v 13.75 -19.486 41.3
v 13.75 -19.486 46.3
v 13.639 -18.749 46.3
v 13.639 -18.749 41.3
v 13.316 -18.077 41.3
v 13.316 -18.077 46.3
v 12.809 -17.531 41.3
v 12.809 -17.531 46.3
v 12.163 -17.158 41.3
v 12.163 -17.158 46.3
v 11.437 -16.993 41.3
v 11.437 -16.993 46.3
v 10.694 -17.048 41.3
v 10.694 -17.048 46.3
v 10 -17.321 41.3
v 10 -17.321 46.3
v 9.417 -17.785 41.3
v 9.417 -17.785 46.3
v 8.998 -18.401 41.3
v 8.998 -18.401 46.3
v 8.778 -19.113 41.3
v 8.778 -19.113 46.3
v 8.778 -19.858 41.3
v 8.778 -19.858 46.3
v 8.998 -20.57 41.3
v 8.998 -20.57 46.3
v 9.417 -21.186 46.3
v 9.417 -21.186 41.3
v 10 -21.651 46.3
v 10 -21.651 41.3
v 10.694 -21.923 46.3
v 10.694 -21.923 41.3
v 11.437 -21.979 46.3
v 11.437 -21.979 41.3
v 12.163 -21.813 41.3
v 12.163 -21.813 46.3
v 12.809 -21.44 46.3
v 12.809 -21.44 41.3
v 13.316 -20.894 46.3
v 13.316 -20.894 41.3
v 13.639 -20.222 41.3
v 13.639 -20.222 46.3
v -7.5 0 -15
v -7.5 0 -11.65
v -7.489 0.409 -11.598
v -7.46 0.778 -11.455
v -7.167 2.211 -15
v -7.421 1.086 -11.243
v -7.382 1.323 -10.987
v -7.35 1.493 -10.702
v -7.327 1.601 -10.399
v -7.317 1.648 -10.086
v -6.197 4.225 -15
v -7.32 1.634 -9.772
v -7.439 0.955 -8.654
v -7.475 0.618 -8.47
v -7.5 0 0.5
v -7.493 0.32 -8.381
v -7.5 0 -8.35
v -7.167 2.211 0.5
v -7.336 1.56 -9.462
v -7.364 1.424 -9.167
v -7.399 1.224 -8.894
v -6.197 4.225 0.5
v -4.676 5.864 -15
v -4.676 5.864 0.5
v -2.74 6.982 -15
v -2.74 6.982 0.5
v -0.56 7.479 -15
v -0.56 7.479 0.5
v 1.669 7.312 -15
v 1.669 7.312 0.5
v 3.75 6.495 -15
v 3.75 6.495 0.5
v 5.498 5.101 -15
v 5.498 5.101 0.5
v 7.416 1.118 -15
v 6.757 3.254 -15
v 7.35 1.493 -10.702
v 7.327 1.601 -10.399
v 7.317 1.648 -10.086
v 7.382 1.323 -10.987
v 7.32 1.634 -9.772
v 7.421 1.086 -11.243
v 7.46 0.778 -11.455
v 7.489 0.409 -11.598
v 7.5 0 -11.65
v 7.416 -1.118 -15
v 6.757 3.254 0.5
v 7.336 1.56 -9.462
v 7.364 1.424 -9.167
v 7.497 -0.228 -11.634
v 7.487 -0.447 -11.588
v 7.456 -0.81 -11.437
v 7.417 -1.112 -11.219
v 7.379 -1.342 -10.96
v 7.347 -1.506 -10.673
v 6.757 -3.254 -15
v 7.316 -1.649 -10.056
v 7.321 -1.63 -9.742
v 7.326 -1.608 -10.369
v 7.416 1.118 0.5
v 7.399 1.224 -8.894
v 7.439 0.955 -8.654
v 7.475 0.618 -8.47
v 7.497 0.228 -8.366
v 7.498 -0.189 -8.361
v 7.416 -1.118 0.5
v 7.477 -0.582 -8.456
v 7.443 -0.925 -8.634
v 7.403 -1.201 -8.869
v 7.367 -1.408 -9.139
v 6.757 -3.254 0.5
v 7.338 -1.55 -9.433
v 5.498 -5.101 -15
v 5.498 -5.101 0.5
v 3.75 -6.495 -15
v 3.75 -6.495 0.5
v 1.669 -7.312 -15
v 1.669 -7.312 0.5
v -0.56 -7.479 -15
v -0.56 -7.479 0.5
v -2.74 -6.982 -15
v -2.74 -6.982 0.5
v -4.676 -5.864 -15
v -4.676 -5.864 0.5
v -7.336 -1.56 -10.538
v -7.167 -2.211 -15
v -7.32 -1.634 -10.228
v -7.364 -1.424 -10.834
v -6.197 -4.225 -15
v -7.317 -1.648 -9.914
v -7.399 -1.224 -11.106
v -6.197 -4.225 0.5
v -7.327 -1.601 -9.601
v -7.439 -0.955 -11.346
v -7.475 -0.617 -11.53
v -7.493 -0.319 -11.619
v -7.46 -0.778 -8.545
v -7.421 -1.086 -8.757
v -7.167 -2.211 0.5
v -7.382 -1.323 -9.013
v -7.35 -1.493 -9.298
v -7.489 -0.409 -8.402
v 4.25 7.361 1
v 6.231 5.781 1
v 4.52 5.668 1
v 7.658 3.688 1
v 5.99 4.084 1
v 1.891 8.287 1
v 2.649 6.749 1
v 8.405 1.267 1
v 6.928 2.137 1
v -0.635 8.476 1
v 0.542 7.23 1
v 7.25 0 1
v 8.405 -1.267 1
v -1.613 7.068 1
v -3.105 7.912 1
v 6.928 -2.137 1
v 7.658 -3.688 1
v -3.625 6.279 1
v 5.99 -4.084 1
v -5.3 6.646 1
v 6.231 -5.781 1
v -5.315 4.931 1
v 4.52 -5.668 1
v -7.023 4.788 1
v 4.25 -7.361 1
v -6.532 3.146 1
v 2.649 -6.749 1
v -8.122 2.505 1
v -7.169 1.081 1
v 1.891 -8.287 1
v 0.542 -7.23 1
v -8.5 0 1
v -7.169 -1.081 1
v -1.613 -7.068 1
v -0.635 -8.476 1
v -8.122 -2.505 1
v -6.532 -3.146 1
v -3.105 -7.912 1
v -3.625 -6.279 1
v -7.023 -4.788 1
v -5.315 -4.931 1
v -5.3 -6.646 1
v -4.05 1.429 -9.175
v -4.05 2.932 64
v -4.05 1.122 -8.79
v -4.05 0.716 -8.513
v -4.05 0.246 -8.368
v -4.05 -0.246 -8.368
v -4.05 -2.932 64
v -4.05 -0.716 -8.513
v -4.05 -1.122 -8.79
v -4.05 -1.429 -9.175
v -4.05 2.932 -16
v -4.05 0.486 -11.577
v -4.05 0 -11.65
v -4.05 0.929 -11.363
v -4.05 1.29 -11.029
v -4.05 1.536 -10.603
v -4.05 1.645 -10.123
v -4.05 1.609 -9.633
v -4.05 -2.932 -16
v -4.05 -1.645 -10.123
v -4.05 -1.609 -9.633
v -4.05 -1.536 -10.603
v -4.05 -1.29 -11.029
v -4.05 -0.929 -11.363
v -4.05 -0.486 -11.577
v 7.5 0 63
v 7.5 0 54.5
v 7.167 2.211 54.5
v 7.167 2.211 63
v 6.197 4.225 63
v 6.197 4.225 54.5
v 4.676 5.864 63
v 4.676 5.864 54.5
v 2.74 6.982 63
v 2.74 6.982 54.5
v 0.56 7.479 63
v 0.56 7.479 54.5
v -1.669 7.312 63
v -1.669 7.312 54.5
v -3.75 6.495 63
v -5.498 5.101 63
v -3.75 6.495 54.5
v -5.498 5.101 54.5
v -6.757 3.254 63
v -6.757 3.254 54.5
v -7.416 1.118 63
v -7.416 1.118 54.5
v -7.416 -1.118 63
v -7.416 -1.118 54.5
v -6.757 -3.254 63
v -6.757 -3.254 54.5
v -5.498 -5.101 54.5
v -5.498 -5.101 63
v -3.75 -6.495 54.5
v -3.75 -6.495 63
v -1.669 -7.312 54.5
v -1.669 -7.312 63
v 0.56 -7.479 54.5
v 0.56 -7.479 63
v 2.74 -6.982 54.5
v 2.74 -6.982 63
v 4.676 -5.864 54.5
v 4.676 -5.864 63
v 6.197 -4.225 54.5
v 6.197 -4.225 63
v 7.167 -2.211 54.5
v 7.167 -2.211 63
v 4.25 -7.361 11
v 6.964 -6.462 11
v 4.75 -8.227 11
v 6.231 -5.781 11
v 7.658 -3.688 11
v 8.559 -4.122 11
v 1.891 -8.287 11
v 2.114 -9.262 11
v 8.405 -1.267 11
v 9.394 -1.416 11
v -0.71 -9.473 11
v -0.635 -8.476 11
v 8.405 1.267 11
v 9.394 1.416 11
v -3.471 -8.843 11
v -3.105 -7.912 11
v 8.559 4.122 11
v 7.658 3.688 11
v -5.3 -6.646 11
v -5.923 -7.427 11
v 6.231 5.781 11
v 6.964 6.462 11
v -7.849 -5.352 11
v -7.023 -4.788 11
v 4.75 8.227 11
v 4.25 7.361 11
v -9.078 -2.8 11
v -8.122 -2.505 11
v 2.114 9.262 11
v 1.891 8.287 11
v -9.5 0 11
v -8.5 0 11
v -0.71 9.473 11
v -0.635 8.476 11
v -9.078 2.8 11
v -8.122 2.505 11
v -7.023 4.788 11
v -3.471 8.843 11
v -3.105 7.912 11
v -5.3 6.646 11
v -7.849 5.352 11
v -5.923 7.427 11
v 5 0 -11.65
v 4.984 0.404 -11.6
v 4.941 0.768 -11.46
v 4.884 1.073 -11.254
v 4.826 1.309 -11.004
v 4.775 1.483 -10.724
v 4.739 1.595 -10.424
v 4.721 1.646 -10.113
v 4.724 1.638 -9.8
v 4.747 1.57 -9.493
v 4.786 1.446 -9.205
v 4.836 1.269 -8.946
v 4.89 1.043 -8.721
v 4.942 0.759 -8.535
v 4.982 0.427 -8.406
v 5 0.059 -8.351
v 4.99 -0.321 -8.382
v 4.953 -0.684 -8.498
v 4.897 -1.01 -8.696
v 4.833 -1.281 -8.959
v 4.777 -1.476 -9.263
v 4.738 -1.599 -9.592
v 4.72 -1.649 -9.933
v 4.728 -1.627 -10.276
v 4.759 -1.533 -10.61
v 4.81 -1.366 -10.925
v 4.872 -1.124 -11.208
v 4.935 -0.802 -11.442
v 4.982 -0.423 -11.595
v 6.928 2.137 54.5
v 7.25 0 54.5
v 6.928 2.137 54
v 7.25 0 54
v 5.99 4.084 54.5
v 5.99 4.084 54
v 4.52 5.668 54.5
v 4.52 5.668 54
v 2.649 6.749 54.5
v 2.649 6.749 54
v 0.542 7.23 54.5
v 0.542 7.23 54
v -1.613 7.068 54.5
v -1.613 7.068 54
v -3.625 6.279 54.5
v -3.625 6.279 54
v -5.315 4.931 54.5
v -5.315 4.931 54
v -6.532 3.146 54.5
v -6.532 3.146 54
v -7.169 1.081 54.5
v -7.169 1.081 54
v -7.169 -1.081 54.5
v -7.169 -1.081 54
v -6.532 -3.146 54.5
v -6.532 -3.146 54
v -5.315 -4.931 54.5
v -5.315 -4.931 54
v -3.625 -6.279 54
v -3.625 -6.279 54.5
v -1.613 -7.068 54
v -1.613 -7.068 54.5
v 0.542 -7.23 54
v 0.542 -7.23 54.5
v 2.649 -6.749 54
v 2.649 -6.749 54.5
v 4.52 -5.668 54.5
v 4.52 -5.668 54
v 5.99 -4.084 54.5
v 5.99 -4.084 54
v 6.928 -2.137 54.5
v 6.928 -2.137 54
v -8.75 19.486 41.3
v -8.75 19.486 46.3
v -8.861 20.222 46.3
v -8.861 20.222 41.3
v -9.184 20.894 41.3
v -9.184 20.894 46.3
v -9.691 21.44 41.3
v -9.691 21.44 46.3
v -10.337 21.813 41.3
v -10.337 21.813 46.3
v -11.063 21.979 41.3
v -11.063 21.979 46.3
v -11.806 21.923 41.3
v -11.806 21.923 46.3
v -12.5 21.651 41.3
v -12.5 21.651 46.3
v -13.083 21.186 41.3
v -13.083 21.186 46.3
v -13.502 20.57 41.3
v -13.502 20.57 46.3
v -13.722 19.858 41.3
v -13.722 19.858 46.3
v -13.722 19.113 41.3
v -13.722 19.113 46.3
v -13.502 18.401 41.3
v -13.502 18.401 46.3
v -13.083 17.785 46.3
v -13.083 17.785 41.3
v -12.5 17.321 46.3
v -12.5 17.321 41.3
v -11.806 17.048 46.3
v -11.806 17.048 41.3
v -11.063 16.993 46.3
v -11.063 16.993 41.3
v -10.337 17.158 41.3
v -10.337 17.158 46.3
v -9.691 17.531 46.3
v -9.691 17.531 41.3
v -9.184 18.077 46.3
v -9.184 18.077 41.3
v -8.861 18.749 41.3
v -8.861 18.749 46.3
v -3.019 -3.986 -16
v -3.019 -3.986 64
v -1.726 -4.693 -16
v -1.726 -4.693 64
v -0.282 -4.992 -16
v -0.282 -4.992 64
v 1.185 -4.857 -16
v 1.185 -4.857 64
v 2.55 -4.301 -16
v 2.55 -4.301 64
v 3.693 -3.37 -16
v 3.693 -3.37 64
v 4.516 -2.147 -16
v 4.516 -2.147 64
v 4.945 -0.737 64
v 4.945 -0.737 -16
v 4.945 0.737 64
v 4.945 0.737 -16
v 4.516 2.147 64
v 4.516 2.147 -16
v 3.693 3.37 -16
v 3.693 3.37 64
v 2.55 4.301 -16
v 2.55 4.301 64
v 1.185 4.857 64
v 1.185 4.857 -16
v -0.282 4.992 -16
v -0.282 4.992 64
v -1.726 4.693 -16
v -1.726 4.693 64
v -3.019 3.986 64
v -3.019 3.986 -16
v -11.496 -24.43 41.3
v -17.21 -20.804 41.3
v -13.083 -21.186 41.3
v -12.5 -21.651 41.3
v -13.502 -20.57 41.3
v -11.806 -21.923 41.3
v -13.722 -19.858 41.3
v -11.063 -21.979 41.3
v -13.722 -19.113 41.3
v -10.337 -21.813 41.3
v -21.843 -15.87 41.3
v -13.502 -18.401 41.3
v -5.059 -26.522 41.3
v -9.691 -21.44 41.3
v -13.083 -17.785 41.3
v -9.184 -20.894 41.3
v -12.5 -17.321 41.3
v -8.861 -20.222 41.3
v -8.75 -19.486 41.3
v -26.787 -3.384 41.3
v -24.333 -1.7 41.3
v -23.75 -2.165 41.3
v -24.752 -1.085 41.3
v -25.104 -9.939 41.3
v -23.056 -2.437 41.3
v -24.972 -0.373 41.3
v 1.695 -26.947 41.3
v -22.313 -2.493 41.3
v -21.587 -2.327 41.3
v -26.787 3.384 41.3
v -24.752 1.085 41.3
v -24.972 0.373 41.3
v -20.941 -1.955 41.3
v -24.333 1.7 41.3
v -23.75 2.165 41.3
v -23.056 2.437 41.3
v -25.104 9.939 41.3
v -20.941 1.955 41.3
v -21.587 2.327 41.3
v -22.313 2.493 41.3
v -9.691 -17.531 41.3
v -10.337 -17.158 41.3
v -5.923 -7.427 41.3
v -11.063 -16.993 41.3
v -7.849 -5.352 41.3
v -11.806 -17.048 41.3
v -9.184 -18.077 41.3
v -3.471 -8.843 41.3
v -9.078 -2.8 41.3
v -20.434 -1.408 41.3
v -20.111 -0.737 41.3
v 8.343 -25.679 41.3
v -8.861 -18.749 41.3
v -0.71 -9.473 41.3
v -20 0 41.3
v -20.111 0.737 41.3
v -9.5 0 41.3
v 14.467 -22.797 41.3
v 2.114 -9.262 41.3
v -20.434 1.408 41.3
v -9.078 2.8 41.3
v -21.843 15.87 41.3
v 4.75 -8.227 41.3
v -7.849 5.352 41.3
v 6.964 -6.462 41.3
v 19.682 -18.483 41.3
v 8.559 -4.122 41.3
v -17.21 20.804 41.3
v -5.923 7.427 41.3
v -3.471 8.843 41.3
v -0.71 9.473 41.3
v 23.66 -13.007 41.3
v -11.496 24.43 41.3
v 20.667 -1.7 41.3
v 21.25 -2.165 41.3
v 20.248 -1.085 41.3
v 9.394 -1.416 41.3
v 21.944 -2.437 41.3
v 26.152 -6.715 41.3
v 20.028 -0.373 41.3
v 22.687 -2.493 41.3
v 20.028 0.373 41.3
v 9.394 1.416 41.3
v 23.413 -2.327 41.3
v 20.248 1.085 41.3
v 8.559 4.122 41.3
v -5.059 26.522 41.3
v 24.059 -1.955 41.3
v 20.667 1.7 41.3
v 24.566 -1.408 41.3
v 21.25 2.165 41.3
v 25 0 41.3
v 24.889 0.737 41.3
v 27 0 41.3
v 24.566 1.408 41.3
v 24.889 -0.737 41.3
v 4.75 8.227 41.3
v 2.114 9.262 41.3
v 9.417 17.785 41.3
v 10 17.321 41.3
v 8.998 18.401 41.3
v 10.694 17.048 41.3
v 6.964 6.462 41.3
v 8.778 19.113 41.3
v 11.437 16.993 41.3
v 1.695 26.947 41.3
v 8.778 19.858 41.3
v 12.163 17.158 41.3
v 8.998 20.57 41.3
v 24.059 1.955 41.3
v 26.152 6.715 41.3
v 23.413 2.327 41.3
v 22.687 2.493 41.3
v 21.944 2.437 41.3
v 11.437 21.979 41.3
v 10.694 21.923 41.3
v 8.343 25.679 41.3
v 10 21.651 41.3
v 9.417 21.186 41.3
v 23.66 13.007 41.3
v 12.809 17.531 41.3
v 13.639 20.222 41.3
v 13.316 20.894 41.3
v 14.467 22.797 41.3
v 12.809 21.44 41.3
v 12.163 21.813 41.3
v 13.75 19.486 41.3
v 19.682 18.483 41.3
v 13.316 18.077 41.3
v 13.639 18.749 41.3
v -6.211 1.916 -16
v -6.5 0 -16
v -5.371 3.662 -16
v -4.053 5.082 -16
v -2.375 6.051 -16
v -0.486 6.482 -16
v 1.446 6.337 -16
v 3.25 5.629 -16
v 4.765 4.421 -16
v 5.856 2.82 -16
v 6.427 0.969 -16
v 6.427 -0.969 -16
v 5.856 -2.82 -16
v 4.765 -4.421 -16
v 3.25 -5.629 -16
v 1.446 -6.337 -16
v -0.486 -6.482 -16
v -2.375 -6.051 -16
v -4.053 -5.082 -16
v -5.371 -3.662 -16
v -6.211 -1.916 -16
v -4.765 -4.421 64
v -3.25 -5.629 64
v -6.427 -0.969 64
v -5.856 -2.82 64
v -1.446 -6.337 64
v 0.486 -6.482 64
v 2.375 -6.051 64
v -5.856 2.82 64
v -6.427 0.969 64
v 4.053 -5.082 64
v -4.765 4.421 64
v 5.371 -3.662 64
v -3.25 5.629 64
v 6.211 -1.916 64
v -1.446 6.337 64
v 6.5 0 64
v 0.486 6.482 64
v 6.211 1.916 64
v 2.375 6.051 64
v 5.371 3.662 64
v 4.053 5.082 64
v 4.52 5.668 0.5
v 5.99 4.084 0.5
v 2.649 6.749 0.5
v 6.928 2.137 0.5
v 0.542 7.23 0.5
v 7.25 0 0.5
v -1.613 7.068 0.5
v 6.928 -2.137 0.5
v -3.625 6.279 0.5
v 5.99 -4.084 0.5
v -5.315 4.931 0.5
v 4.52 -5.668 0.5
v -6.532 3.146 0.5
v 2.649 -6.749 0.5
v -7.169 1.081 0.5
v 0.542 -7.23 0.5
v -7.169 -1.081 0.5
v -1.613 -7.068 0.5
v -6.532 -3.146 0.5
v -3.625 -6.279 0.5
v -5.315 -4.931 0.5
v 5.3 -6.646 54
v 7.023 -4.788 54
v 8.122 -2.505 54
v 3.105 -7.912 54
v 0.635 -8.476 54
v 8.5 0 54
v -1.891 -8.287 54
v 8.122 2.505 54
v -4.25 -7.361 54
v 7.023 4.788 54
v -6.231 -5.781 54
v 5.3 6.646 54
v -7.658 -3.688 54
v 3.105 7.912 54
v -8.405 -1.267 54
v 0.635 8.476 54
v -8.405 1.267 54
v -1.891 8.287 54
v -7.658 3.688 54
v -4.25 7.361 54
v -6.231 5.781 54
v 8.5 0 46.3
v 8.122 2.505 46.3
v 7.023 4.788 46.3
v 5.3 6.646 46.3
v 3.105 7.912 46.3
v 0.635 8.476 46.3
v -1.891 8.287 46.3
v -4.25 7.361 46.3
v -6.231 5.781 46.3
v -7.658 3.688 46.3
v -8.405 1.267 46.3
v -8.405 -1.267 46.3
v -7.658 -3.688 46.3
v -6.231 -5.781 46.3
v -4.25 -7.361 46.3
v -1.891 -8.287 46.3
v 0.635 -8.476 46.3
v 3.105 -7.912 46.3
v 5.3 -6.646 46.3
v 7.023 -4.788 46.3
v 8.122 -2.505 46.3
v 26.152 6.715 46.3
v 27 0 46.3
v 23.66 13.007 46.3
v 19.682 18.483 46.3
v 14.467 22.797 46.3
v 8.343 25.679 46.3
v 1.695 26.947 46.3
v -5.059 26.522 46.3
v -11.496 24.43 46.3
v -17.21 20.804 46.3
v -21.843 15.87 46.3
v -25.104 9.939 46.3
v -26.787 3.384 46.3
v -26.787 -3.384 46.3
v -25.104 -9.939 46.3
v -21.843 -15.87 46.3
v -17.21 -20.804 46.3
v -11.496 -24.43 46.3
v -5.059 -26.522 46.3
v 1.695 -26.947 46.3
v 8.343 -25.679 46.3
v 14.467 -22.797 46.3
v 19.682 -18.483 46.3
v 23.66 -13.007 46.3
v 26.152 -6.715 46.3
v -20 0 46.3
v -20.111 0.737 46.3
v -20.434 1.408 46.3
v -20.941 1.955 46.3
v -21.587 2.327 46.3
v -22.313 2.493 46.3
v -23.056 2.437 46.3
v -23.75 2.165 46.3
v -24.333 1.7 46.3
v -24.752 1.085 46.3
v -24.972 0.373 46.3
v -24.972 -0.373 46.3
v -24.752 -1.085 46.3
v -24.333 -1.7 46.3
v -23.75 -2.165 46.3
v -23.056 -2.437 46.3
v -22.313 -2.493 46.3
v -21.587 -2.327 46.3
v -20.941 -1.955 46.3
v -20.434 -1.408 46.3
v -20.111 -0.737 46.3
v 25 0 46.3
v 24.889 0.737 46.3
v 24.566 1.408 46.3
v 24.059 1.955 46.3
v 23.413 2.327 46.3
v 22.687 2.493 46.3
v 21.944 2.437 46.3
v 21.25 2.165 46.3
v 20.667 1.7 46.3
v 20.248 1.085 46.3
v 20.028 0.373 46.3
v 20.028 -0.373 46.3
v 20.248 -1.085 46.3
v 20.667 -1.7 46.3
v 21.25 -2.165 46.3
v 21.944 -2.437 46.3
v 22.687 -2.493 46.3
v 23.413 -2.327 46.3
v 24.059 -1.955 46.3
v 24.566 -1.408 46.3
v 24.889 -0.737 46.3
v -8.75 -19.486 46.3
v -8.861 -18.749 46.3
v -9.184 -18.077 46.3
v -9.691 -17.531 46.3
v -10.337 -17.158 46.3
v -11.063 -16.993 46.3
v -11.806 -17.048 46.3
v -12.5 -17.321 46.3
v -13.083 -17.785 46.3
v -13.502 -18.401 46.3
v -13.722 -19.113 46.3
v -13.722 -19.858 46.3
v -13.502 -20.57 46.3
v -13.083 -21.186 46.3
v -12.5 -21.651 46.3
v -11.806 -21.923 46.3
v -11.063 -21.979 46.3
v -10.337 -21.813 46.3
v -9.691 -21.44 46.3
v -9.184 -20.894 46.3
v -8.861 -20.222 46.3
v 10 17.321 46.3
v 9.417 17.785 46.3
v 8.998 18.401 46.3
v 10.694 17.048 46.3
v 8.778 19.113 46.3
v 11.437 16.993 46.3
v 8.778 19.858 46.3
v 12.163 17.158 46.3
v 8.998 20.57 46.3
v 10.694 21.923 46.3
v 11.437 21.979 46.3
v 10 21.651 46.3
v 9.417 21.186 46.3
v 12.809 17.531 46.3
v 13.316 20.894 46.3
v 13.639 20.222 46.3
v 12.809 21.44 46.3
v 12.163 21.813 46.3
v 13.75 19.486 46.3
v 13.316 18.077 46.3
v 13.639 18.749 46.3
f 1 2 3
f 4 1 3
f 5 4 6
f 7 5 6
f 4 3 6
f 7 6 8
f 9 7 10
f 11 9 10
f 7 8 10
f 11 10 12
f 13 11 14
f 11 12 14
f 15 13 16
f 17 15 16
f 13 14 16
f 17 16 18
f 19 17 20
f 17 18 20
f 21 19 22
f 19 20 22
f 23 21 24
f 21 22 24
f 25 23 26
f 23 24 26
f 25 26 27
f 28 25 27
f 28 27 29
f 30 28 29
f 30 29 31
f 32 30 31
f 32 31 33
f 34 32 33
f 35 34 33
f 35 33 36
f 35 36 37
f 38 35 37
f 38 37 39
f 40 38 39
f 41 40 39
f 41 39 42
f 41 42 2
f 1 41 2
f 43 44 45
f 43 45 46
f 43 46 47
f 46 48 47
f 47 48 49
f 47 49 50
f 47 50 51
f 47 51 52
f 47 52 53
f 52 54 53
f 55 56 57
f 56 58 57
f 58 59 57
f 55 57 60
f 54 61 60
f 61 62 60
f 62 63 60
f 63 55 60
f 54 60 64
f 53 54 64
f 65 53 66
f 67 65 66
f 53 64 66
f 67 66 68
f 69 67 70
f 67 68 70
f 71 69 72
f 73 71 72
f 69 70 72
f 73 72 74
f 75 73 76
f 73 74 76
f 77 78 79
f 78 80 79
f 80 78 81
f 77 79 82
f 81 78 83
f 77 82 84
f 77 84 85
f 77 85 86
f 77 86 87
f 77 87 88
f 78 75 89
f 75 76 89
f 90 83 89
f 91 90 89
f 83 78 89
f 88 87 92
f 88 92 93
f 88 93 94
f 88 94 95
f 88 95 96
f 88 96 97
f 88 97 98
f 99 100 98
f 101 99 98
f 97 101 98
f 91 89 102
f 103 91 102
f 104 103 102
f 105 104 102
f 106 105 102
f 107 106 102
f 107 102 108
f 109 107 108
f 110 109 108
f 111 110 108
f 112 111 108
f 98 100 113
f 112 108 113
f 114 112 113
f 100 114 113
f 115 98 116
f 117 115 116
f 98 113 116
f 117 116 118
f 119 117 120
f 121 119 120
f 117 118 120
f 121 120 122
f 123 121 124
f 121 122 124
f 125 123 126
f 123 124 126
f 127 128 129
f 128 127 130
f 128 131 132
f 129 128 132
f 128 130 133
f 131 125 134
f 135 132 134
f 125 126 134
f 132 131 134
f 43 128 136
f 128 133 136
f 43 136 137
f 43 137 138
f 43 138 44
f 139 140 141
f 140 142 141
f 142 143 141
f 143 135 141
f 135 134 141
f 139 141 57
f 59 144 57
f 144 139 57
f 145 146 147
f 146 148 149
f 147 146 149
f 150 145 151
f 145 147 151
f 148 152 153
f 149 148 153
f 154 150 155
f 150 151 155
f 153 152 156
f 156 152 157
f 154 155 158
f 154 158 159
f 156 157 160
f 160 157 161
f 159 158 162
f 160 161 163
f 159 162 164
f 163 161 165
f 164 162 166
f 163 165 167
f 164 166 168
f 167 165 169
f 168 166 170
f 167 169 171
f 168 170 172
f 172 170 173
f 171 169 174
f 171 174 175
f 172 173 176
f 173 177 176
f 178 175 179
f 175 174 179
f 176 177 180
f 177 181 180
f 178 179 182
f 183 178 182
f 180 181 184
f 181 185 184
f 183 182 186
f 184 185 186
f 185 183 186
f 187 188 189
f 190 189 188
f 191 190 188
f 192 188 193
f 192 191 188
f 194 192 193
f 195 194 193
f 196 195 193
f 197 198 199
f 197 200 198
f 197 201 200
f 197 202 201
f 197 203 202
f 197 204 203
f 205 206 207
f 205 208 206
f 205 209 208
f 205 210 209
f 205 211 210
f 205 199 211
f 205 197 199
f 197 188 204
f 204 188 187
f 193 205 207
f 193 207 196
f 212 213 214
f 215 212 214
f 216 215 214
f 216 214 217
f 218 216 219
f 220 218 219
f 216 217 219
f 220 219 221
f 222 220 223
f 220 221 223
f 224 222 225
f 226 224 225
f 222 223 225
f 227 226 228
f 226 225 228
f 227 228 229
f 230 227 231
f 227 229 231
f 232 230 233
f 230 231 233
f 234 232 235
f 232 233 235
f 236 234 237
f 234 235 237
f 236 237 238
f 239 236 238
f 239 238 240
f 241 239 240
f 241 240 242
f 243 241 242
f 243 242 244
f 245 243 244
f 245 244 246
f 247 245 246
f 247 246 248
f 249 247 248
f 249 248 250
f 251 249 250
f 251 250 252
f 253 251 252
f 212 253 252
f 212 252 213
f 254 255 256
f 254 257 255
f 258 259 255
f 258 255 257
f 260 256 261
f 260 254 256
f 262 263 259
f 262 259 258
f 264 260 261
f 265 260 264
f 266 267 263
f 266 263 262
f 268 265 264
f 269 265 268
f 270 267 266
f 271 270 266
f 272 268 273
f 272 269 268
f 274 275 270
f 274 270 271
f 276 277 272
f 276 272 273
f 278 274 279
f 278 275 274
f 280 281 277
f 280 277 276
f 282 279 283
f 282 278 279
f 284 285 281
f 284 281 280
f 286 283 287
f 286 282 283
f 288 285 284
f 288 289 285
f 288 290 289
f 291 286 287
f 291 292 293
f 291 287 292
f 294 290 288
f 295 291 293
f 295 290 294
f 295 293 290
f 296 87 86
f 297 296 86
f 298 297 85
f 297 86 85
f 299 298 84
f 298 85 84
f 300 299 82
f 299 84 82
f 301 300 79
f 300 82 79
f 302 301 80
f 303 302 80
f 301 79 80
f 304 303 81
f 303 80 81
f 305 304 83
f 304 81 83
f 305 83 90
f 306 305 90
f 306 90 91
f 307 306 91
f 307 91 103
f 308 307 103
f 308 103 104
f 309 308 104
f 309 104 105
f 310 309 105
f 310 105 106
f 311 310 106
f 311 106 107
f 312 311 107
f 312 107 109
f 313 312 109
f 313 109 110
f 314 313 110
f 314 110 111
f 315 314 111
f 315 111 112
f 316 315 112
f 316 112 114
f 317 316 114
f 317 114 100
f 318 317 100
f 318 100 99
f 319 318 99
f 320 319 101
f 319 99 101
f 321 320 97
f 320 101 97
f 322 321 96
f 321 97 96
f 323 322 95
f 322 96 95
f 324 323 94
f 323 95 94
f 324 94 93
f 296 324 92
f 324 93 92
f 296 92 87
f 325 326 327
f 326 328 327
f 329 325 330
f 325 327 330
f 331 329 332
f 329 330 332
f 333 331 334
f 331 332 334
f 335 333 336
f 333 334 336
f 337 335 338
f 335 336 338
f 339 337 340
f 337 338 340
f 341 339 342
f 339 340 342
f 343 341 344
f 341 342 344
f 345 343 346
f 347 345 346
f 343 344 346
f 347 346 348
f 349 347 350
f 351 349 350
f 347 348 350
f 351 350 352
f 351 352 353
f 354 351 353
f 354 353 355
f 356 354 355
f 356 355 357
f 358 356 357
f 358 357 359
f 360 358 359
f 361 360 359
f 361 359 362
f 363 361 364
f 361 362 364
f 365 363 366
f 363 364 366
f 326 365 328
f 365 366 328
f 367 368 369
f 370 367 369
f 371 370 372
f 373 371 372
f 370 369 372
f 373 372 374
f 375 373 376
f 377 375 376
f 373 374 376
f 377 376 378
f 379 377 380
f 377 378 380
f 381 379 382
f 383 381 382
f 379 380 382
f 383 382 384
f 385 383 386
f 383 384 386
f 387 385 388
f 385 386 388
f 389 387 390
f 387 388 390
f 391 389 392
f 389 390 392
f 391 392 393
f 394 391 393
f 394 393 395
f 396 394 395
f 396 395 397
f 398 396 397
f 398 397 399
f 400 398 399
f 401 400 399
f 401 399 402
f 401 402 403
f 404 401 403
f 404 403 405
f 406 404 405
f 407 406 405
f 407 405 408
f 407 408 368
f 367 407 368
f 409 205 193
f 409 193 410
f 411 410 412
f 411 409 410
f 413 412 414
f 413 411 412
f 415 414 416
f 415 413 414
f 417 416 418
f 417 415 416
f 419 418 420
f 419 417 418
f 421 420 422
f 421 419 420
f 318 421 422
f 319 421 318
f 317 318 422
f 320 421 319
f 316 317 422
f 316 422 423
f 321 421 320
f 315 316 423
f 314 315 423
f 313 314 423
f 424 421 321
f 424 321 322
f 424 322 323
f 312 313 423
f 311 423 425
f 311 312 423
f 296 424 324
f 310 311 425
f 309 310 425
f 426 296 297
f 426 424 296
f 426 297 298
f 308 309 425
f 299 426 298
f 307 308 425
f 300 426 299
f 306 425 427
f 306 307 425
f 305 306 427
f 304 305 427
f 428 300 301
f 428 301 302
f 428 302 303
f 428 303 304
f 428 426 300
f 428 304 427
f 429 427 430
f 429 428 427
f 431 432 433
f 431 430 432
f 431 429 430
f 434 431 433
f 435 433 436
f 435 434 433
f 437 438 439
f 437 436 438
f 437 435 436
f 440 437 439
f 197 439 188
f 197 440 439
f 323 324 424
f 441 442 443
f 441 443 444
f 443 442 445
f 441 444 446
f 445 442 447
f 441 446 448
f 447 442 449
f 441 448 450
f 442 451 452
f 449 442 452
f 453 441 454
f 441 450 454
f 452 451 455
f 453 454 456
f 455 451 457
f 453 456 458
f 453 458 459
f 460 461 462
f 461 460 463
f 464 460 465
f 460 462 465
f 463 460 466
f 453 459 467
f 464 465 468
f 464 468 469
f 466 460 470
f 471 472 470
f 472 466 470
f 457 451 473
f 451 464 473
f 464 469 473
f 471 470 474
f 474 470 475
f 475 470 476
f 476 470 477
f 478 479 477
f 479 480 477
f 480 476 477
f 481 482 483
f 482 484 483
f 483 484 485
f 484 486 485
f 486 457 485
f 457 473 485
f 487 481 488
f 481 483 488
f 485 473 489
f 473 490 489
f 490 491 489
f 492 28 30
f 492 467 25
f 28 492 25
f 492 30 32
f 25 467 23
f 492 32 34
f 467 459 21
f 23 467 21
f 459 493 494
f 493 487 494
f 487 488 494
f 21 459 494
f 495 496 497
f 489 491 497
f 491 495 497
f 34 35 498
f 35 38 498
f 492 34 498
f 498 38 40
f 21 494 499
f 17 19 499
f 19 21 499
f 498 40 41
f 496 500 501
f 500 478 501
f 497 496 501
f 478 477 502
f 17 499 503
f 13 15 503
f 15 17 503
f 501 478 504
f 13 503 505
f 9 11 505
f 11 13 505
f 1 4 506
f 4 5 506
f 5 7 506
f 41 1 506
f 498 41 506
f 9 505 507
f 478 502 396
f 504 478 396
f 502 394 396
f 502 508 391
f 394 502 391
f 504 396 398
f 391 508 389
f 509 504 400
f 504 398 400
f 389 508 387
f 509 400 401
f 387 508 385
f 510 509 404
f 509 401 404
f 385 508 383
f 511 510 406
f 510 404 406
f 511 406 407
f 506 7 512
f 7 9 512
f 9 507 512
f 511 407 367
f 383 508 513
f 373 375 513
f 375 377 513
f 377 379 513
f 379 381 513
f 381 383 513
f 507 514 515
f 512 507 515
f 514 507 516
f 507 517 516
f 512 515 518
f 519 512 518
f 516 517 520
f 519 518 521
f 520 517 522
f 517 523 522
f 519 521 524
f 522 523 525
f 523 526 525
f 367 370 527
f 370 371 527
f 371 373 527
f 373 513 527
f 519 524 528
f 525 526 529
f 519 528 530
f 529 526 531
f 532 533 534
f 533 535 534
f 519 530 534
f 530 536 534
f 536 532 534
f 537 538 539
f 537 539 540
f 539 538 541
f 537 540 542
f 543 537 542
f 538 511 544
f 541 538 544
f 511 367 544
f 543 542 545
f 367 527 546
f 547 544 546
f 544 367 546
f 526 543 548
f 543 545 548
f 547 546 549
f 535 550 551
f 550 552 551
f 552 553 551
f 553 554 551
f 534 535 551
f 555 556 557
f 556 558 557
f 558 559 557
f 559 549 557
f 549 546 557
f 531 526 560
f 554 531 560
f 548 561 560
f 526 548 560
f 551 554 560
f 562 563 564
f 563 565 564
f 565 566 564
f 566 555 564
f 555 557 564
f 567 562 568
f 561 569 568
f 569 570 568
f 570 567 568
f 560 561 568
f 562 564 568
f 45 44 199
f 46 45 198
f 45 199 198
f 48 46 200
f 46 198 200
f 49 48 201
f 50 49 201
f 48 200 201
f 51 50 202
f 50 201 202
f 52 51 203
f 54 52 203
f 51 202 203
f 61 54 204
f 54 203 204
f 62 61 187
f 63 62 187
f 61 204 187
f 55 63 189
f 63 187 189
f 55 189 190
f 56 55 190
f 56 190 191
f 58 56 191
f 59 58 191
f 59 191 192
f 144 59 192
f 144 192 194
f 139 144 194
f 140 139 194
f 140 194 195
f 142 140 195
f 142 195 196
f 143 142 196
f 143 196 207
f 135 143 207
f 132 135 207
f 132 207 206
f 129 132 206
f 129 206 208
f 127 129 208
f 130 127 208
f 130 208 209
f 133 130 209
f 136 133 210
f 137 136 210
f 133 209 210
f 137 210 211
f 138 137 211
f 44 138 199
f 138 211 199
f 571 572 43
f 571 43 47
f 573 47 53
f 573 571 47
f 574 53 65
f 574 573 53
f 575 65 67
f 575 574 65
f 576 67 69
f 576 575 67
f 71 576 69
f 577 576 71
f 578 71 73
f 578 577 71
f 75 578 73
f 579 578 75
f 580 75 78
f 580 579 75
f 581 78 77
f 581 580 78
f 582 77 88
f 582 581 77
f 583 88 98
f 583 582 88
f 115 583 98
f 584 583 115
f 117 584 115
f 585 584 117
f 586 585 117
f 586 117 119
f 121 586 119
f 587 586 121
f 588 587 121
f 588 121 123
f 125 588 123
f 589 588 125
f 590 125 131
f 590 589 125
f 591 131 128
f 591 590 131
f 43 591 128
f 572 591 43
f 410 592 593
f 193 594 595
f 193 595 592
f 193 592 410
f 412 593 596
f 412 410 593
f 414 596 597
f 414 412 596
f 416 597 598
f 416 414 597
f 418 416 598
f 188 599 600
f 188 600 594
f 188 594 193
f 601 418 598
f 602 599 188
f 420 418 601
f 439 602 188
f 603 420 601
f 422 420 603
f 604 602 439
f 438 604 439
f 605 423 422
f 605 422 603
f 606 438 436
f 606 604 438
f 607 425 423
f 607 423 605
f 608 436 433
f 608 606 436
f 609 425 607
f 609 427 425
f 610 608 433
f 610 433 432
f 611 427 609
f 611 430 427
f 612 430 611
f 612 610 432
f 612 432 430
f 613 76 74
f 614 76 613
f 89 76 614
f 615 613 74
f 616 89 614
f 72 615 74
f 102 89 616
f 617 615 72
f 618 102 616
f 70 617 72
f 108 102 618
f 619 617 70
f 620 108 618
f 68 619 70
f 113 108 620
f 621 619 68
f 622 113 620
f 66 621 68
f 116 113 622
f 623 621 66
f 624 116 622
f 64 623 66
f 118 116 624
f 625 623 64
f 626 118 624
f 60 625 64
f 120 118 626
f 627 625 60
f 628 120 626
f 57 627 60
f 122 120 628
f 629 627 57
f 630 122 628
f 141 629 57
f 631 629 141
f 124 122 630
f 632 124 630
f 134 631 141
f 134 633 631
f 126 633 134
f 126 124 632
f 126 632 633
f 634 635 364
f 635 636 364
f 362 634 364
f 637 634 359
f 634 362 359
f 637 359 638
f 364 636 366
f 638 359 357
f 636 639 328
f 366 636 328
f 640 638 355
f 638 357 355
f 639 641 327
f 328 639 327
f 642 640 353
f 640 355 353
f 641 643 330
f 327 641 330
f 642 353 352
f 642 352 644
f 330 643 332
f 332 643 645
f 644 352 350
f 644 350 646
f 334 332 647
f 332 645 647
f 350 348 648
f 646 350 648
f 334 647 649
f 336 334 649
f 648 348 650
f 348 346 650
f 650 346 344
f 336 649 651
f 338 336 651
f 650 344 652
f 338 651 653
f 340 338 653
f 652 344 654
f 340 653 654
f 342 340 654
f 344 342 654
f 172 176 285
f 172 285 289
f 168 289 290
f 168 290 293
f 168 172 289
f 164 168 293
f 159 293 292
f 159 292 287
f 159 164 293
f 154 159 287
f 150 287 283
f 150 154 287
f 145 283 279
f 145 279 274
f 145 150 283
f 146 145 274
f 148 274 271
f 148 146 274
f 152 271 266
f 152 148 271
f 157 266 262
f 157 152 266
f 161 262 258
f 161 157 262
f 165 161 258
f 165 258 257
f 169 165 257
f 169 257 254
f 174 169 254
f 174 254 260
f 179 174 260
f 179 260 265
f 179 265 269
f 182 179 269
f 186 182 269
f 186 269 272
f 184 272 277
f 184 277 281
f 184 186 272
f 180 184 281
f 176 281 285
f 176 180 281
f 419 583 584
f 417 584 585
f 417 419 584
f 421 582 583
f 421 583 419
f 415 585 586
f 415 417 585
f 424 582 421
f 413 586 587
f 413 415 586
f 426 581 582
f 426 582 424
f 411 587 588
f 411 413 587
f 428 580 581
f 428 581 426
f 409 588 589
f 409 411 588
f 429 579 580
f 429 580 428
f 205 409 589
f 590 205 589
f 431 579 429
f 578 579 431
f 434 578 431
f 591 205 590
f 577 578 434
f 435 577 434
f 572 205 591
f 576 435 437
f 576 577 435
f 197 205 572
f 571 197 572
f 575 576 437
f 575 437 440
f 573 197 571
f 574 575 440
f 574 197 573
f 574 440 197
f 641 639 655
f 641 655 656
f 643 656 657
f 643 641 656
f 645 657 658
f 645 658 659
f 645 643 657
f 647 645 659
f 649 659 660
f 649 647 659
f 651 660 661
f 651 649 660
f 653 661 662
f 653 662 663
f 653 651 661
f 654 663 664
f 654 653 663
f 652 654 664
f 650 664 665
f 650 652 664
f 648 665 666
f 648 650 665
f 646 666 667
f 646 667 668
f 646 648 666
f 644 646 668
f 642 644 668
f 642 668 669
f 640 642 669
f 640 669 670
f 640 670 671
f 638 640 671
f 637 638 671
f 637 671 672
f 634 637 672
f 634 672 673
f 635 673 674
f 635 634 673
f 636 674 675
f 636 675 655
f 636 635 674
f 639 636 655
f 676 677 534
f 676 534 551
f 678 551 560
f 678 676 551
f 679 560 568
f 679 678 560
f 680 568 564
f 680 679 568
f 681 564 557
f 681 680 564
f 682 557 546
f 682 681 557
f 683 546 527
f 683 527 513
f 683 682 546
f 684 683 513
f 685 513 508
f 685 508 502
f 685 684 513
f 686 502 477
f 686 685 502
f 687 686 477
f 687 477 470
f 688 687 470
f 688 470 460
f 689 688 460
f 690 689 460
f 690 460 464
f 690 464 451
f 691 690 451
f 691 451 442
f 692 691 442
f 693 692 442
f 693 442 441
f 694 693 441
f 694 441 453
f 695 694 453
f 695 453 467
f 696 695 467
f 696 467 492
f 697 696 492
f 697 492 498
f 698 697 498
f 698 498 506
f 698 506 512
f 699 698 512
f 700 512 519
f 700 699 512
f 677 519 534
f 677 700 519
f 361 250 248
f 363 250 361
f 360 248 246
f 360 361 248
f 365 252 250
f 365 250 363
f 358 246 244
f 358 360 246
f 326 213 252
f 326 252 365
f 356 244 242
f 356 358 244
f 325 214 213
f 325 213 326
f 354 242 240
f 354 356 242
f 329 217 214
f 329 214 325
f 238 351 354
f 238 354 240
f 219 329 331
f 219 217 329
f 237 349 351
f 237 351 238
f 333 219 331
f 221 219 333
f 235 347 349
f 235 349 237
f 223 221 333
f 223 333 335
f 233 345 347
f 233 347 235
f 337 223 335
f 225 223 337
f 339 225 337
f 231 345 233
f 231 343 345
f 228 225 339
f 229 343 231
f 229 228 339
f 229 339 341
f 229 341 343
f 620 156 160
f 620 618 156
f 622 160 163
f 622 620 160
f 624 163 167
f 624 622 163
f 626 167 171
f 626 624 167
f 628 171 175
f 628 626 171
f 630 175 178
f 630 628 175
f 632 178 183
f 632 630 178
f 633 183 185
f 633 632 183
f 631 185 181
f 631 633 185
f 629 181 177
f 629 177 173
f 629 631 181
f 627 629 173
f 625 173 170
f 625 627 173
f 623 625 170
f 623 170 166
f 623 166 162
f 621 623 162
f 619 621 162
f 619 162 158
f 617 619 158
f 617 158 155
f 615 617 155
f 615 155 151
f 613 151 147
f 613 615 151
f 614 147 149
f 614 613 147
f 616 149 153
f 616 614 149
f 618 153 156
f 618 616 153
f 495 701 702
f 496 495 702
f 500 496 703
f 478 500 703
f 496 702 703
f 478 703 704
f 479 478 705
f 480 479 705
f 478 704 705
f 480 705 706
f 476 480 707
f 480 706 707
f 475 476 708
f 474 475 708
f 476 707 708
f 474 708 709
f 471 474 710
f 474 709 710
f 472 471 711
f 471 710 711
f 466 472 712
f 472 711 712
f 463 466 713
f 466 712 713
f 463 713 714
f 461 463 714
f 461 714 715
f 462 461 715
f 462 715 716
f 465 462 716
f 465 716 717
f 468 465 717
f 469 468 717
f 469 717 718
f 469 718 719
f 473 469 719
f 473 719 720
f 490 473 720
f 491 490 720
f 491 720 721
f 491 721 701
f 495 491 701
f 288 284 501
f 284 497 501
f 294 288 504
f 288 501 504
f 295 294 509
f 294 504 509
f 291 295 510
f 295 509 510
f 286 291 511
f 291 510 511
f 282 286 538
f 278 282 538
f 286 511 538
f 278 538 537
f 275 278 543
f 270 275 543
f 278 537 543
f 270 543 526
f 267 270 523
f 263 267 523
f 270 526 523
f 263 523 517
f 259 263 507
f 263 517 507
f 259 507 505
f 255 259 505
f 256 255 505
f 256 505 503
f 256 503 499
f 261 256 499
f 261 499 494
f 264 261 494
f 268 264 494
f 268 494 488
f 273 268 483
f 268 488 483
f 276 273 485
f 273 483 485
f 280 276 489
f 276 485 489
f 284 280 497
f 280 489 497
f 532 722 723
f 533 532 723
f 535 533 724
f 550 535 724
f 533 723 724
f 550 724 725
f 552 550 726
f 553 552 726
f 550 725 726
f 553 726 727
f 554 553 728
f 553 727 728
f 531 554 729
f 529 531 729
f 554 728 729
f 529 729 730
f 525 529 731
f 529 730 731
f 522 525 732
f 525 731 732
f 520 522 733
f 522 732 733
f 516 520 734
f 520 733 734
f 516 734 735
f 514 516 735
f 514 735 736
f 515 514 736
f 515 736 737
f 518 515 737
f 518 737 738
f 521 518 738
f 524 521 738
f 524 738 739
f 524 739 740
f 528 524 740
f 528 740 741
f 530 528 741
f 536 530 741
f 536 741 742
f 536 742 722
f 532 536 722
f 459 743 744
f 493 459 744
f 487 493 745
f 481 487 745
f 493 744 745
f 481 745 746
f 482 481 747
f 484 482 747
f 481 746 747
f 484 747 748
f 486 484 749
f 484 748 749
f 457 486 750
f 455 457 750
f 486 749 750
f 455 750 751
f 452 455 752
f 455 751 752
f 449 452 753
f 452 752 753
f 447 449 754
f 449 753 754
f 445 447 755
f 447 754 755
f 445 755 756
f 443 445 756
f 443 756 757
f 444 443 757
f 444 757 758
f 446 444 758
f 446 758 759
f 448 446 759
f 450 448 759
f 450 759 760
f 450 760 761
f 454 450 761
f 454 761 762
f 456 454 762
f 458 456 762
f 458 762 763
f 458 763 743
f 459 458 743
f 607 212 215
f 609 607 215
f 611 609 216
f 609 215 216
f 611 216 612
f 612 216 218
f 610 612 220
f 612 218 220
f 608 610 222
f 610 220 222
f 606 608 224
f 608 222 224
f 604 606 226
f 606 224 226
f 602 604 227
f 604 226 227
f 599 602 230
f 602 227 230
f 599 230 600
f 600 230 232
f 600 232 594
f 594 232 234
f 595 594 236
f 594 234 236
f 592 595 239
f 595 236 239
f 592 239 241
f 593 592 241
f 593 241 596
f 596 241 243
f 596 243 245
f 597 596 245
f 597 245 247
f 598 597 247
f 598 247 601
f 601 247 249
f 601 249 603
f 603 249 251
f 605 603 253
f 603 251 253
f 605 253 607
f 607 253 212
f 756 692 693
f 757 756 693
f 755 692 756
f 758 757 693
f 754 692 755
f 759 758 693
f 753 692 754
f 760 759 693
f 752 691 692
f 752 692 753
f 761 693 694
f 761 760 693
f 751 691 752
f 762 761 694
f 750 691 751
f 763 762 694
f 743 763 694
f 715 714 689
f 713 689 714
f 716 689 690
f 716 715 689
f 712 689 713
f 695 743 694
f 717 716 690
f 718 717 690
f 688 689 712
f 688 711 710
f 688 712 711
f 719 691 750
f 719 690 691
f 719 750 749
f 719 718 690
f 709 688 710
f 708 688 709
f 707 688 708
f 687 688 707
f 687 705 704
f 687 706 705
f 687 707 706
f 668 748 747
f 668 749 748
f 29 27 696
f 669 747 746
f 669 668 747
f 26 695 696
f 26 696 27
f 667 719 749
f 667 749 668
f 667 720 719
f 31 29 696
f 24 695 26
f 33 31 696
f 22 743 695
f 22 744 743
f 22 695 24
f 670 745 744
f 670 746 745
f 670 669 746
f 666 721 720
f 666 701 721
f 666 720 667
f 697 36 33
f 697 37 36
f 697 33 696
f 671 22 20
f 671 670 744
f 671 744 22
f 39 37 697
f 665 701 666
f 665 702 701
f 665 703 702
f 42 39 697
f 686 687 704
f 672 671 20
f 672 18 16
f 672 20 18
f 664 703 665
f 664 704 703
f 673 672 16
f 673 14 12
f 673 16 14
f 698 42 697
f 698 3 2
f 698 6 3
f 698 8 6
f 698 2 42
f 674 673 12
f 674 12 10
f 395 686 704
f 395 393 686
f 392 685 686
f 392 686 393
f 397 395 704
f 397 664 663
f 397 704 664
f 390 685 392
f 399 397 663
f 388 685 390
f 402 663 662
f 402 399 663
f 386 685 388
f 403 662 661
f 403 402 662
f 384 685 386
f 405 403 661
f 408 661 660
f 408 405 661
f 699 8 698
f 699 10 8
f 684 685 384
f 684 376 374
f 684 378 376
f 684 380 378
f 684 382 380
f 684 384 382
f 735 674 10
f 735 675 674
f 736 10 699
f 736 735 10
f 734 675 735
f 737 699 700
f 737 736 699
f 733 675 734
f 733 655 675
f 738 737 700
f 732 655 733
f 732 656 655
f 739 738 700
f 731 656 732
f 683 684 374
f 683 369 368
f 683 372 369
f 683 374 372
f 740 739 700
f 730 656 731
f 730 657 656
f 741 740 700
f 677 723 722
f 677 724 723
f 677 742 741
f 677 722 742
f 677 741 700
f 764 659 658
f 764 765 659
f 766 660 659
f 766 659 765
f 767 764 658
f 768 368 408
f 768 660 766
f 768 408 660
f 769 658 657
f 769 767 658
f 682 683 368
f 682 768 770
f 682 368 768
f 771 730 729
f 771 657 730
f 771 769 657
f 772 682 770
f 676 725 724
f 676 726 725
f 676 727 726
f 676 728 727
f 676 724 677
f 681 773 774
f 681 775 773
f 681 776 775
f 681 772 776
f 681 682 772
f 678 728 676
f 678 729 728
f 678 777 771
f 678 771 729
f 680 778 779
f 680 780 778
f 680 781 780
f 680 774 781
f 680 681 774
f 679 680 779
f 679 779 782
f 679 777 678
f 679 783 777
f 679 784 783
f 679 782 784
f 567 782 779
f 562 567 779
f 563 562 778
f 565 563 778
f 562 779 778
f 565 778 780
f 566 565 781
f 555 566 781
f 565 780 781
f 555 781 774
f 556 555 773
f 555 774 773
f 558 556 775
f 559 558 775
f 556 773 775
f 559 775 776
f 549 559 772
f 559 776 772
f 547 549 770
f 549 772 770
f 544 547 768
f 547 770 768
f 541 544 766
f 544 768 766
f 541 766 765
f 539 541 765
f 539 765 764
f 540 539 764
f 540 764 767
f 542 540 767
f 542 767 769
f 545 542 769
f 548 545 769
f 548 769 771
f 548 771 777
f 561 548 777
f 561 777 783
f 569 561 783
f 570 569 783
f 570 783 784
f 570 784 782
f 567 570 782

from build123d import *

# Parameters (mm, degrees)
SKETCH_1_R                = 7
EXTRUDE_1_DEPTH           = 54
SKETCH_2_R                = 5
EXTRUDE_2_DEPTH           = 7
CHAMFER_1_SIZE            = 1
SKETCH_3_R                = 10
EXTRUDE_3_DEPTH           = 2
SKETCH_4_R                = 6
EXTRUDE_4_DEPTH           = 25
SKETCH_7_R                = 10
EXTRUDE_5_DEPTH           = 4.3
SKETCH_9_R                = 10
SKETCH_9_R_2              = 6
CUT_EXTRUDE_3_DEPTH       = 1.3
SKETCH_11_R               = 27
SKETCH_11_R_2             = 10
EXTRUDE_6_DEPTH           = 5
SKETCH_12_R               = 9.5
SKETCH_12_R_2             = 6
EXTRUDE_7_DEPTH           = 30
SKETCH_14_R               = 2.5
CUT_EXTRUDE_4_DEPTH       = 10
CUT_EXTRUDE_5_DEPTH       = 30
CHAMFER_2_SIZE            = 1
HOLE_WIZARD_M3_1_D        = 2.5
HOLE_WIZARD_M3_1_DEPTH    = 18.5
HOLE_WIZARD_M3_1_TIP      = 0.751075774
SKETCH_22_W               = 38.47112098
SKETCH_22_H               = 24.703275639
CUT_EXTRUDE_10_DEPTH      = 28
CUT_EXTRUDE_10_DEPTH_BACK = 28
SKETCH_24_R               = 9.5
EXTRUDE_9_DEPTH           = 10.3
SKETCH_25_R               = 7.5
EXTRUDE_10_DEPTH          = 17
SKETCH_26_W               = 19.870375241
SKETCH_26_H               = 17.333591793
CUT_EXTRUDE_11_DEPTH      = 28
CUT_EXTRUDE_11_DEPTH_BACK = 28
SKETCH_27_R               = 9.5
EXTRUDE_11_DEPTH          = 7.7
SKETCH_29_R               = 7.5
EXTRUDE_12_DEPTH          = 10
CUT_EXTRUDE_12_REACH      = 82
HOLE_WIZARD_M4_1_D        = 3.3
CHAMFER_4_SIZE            = 1
SKETCH_33_R               = 9.5
SKETCH_33_R_2             = 8.5
CUT_EXTRUDE_13_DEPTH      = 10
SKETCH_34_R               = 9.5
SKETCH_34_R_2             = 8.5
CUT_EXTRUDE_14_DEPTH      = 7.7
SKETCH_35_W               = 0.25
SKETCH_35_H               = 0.5
SKETCH_36_W               = 0.25
SKETCH_36_H               = 0.5


with BuildPart() as part:
    # 草图1 → 凸台-拉伸1 (new body)
    with BuildSketch(Plane.XY):
        Circle(SKETCH_1_R)
    extrude(amount=EXTRUDE_1_DEPTH)

    # 草图2 → 凸台-拉伸2 (add)
    with BuildSketch(Plane.XY.offset(54)):
        Circle(SKETCH_2_R)
    extrude(amount=EXTRUDE_2_DEPTH)

    # 倒角1
    chamfer_1_edges = [part.edges().sort_by_distance(p)[0] for p in [
        (-5, 0, 61),
    ]]
    chamfer(chamfer_1_edges, length=CHAMFER_1_SIZE)

    # 草图3 → 凸台-拉伸3 (add)
    with BuildSketch(Plane.XY.offset(42)):
        Circle(SKETCH_3_R)
    extrude(amount=-EXTRUDE_3_DEPTH)

    # 草图4 → 凸台-拉伸4 (add)
    with BuildSketch(Plane(origin=(0, 0, 0), x_dir=(-1, 0, 0), z_dir=(0, 0, -1))):
        Circle(SKETCH_4_R)
    extrude(amount=EXTRUDE_4_DEPTH)

    # 草图7 → 凸台-拉伸5 (add)
    with BuildSketch(Plane.XY.offset(42)):
        Circle(SKETCH_7_R)
    extrude(amount=EXTRUDE_5_DEPTH)

    # 草图9 → 切除-拉伸3 (cut)
    with BuildSketch(Plane(origin=(0, 0, 40), x_dir=(-1, 0, 0), z_dir=(0, 0, -1))):
        Circle(SKETCH_9_R)
        Circle(SKETCH_9_R_2, mode=Mode.SUBTRACT)
    extrude(amount=-CUT_EXTRUDE_3_DEPTH, mode=Mode.SUBTRACT)

    # 草图11 → 凸台-拉伸6 (add)
    with BuildSketch(Plane.XY.offset(46.3)):
        Circle(SKETCH_11_R)
        Circle(SKETCH_11_R_2, mode=Mode.SUBTRACT)
    extrude(amount=-EXTRUDE_6_DEPTH)

    # 草图12 → 凸台-拉伸7 (add)
    with BuildSketch(Plane(origin=(0, 0, 41.3), x_dir=(-1, 0, 0), z_dir=(0, 0, -1))):
        Circle(SKETCH_12_R)
        Circle(SKETCH_12_R_2, mode=Mode.SUBTRACT)
    extrude(amount=EXTRUDE_7_DEPTH)

    # 草图14 → 切除-拉伸4 (cut)
    with BuildSketch(Plane.XY.offset(46.3)):
        with Locations((22.5, 0)):
            Circle(SKETCH_14_R)
        with Locations((11.25, -19.485571585)):
            Circle(SKETCH_14_R)
        with Locations((-11.25, -19.485571585)):
            Circle(SKETCH_14_R)
        with Locations((-22.5, 0)):
            Circle(SKETCH_14_R)
        with Locations((-11.25, 19.485571585)):
            Circle(SKETCH_14_R)
        with Locations((11.25, 19.485571585)):
            Circle(SKETCH_14_R)
    extrude(amount=-CUT_EXTRUDE_4_DEPTH, mode=Mode.SUBTRACT)

    # 草图13 → 切除-拉伸5 (cut)
    with BuildSketch(Plane(origin=(0, 0, -25), x_dir=(-1, 0, 0), z_dir=(0, 0, -1))):
        with BuildLine():
            Line((2.15, 2.092247595), (2.15, -2.092247595))
            ThreePointArc((2.15, -2.092247595), (0, -3), (-2.15, -2.092247595))
            Line((-2.15, -2.092247595), (-2.15, 2.092247595))
            ThreePointArc((-2.15, 2.092247595), (0, 3), (2.15, 2.092247595))
        make_face()
    extrude(amount=-CUT_EXTRUDE_5_DEPTH, mode=Mode.SUBTRACT)

    # 倒角2
    chamfer_2_edges = [part.edges().sort_by_distance(p)[0] for p in [
        (6, 0, -25),
    ]]
    chamfer(chamfer_2_edges, length=CHAMFER_2_SIZE)

    # M3 螺纹孔1
    with Locations(Plane(origin=(7.85, 0, -17), x_dir=(0, 0, 1), z_dir=(1, 0, 0))):
        with Locations((0, 0)):
            Hole(HOLE_WIZARD_M3_1_D / 2, depth=HOLE_WIZARD_M3_1_DEPTH)
            with Locations((0, 0, -(HOLE_WIZARD_M3_1_DEPTH + HOLE_WIZARD_M3_1_TIP / 2))):  # 118° drill point
                Cone(0, HOLE_WIZARD_M3_1_D / 2, HOLE_WIZARD_M3_1_TIP, mode=Mode.SUBTRACT)

    # 草图22 → 切除-拉伸10 (cut, two sides)
    with BuildSketch(Plane(origin=(0, 0, 0), x_dir=(0, 0, -1), z_dir=(1, 0, 0))) as cut_extrude_10_sk:
        with Locations((7.93556049, 2.744045787)):
            Rectangle(SKETCH_22_W, SKETCH_22_H)
    extrude(amount=CUT_EXTRUDE_10_DEPTH, mode=Mode.SUBTRACT)
    extrude(cut_extrude_10_sk.sketch, amount=-CUT_EXTRUDE_10_DEPTH_BACK, mode=Mode.SUBTRACT)

    # 草图24 → 凸台-拉伸9 (add)
    with BuildSketch(Plane(origin=(0, 0, 11.3), x_dir=(-1, 0, 0), z_dir=(0, 0, -1))):
        Circle(SKETCH_24_R)
    extrude(amount=EXTRUDE_9_DEPTH)

    # 草图25 → 凸台-拉伸10 (add)
    with BuildSketch(Plane(origin=(0, 0, 1), x_dir=(-1, 0, 0), z_dir=(0, 0, -1))):
        Circle(SKETCH_25_R)
    extrude(amount=EXTRUDE_10_DEPTH)

    # 草图26 → 切除-拉伸11 (cut, two sides)
    with BuildSketch(Plane(origin=(0, 0, 0), x_dir=(0, 0, -1), z_dir=(1, 0, 0))) as cut_extrude_11_sk:
        with Locations((-56.23518762, 1.256529054)):
            Rectangle(SKETCH_26_W, SKETCH_26_H)
    extrude(amount=CUT_EXTRUDE_11_DEPTH, mode=Mode.SUBTRACT)
    extrude(cut_extrude_11_sk.sketch, amount=-CUT_EXTRUDE_11_DEPTH_BACK, mode=Mode.SUBTRACT)

    # 草图27 → 凸台-拉伸11 (add)
    with BuildSketch(Plane.XY.offset(46.3)):
        Circle(SKETCH_27_R)
    extrude(amount=EXTRUDE_11_DEPTH)

    # 草图29 → 凸台-拉伸12 (add)
    with BuildSketch(Plane.XY.offset(54)):
        Circle(SKETCH_29_R)
    extrude(amount=EXTRUDE_12_DEPTH)

    # 草图30 → 切除-拉伸12 (cut, up to next)
    with BuildSketch(Plane(origin=(0, 0, -16), x_dir=(-1, 0, 0), z_dir=(0, 0, -1)), mode=Mode.PRIVATE) as cut_extrude_12_sk1:
        with BuildLine():
            Line((4.05, 2.932149382), (4.05, -2.932149382))
            ThreePointArc((4.05, -2.932149382), (-5, 0), (4.05, 2.932149382))
        make_face()
    cut_extrude_12_tool1 = extrude(cut_extrude_12_sk1.sketch, amount=-CUT_EXTRUDE_12_REACH, mode=Mode.PRIVATE) & part.part
    add(cut_extrude_12_tool1.solids().sort_by_distance((0.224834, 0, -16))[0], mode=Mode.SUBTRACT)

    # M4 螺纹孔1 (through all)
    with Locations(Plane.ZY.offset(9.5)):
        with Locations((-10, 0)):
            Hole(HOLE_WIZARD_M4_1_D / 2)

    # 倒角4
    chamfer_4_edges = [part.edges().sort_by_distance(p)[0] for p in [
        (7.5, 0, -16),
        (-7.5, 0, 64),
    ]]
    chamfer(chamfer_4_edges, length=CHAMFER_4_SIZE)

    # 草图33 → 切除-拉伸13 (cut)
    with BuildSketch(Plane(origin=(0, 0, 1), x_dir=(-1, 0, 0), z_dir=(0, 0, -1))):
        Circle(SKETCH_33_R)
        Circle(SKETCH_33_R_2, mode=Mode.SUBTRACT)
    extrude(amount=-CUT_EXTRUDE_13_DEPTH, mode=Mode.SUBTRACT)

    # 草图34 → 切除-拉伸14 (cut)
    with BuildSketch(Plane.XY.offset(54)):
        Circle(SKETCH_34_R)
        Circle(SKETCH_34_R_2, mode=Mode.SUBTRACT)
    extrude(amount=-CUT_EXTRUDE_14_DEPTH, mode=Mode.SUBTRACT)

    # 草图35 → 切除-旋转1 (revolve, cut)
    with BuildSketch(Plane(origin=(0, 0, 0), x_dir=(1, 0, 0), z_dir=(0, 1, 0))):
        with Locations((7.375, -0.75)):
            Rectangle(SKETCH_35_W, SKETCH_35_H)
    revolve(axis=Axis((0, 0, 1), (0, 0, -1)), mode=Mode.SUBTRACT)

    # 草图36 → 切除-旋转2 (revolve, cut)
    with BuildSketch(Plane(origin=(0, 0, 0), x_dir=(1, 0, 0), z_dir=(0, 1, 0))):
        with Locations((7.375, -54.25)):
            Rectangle(SKETCH_36_W, SKETCH_36_H)
    revolve(axis=Axis((0, 0, 54), (0, 0, 1)), mode=Mode.SUBTRACT)


solid = part.part
